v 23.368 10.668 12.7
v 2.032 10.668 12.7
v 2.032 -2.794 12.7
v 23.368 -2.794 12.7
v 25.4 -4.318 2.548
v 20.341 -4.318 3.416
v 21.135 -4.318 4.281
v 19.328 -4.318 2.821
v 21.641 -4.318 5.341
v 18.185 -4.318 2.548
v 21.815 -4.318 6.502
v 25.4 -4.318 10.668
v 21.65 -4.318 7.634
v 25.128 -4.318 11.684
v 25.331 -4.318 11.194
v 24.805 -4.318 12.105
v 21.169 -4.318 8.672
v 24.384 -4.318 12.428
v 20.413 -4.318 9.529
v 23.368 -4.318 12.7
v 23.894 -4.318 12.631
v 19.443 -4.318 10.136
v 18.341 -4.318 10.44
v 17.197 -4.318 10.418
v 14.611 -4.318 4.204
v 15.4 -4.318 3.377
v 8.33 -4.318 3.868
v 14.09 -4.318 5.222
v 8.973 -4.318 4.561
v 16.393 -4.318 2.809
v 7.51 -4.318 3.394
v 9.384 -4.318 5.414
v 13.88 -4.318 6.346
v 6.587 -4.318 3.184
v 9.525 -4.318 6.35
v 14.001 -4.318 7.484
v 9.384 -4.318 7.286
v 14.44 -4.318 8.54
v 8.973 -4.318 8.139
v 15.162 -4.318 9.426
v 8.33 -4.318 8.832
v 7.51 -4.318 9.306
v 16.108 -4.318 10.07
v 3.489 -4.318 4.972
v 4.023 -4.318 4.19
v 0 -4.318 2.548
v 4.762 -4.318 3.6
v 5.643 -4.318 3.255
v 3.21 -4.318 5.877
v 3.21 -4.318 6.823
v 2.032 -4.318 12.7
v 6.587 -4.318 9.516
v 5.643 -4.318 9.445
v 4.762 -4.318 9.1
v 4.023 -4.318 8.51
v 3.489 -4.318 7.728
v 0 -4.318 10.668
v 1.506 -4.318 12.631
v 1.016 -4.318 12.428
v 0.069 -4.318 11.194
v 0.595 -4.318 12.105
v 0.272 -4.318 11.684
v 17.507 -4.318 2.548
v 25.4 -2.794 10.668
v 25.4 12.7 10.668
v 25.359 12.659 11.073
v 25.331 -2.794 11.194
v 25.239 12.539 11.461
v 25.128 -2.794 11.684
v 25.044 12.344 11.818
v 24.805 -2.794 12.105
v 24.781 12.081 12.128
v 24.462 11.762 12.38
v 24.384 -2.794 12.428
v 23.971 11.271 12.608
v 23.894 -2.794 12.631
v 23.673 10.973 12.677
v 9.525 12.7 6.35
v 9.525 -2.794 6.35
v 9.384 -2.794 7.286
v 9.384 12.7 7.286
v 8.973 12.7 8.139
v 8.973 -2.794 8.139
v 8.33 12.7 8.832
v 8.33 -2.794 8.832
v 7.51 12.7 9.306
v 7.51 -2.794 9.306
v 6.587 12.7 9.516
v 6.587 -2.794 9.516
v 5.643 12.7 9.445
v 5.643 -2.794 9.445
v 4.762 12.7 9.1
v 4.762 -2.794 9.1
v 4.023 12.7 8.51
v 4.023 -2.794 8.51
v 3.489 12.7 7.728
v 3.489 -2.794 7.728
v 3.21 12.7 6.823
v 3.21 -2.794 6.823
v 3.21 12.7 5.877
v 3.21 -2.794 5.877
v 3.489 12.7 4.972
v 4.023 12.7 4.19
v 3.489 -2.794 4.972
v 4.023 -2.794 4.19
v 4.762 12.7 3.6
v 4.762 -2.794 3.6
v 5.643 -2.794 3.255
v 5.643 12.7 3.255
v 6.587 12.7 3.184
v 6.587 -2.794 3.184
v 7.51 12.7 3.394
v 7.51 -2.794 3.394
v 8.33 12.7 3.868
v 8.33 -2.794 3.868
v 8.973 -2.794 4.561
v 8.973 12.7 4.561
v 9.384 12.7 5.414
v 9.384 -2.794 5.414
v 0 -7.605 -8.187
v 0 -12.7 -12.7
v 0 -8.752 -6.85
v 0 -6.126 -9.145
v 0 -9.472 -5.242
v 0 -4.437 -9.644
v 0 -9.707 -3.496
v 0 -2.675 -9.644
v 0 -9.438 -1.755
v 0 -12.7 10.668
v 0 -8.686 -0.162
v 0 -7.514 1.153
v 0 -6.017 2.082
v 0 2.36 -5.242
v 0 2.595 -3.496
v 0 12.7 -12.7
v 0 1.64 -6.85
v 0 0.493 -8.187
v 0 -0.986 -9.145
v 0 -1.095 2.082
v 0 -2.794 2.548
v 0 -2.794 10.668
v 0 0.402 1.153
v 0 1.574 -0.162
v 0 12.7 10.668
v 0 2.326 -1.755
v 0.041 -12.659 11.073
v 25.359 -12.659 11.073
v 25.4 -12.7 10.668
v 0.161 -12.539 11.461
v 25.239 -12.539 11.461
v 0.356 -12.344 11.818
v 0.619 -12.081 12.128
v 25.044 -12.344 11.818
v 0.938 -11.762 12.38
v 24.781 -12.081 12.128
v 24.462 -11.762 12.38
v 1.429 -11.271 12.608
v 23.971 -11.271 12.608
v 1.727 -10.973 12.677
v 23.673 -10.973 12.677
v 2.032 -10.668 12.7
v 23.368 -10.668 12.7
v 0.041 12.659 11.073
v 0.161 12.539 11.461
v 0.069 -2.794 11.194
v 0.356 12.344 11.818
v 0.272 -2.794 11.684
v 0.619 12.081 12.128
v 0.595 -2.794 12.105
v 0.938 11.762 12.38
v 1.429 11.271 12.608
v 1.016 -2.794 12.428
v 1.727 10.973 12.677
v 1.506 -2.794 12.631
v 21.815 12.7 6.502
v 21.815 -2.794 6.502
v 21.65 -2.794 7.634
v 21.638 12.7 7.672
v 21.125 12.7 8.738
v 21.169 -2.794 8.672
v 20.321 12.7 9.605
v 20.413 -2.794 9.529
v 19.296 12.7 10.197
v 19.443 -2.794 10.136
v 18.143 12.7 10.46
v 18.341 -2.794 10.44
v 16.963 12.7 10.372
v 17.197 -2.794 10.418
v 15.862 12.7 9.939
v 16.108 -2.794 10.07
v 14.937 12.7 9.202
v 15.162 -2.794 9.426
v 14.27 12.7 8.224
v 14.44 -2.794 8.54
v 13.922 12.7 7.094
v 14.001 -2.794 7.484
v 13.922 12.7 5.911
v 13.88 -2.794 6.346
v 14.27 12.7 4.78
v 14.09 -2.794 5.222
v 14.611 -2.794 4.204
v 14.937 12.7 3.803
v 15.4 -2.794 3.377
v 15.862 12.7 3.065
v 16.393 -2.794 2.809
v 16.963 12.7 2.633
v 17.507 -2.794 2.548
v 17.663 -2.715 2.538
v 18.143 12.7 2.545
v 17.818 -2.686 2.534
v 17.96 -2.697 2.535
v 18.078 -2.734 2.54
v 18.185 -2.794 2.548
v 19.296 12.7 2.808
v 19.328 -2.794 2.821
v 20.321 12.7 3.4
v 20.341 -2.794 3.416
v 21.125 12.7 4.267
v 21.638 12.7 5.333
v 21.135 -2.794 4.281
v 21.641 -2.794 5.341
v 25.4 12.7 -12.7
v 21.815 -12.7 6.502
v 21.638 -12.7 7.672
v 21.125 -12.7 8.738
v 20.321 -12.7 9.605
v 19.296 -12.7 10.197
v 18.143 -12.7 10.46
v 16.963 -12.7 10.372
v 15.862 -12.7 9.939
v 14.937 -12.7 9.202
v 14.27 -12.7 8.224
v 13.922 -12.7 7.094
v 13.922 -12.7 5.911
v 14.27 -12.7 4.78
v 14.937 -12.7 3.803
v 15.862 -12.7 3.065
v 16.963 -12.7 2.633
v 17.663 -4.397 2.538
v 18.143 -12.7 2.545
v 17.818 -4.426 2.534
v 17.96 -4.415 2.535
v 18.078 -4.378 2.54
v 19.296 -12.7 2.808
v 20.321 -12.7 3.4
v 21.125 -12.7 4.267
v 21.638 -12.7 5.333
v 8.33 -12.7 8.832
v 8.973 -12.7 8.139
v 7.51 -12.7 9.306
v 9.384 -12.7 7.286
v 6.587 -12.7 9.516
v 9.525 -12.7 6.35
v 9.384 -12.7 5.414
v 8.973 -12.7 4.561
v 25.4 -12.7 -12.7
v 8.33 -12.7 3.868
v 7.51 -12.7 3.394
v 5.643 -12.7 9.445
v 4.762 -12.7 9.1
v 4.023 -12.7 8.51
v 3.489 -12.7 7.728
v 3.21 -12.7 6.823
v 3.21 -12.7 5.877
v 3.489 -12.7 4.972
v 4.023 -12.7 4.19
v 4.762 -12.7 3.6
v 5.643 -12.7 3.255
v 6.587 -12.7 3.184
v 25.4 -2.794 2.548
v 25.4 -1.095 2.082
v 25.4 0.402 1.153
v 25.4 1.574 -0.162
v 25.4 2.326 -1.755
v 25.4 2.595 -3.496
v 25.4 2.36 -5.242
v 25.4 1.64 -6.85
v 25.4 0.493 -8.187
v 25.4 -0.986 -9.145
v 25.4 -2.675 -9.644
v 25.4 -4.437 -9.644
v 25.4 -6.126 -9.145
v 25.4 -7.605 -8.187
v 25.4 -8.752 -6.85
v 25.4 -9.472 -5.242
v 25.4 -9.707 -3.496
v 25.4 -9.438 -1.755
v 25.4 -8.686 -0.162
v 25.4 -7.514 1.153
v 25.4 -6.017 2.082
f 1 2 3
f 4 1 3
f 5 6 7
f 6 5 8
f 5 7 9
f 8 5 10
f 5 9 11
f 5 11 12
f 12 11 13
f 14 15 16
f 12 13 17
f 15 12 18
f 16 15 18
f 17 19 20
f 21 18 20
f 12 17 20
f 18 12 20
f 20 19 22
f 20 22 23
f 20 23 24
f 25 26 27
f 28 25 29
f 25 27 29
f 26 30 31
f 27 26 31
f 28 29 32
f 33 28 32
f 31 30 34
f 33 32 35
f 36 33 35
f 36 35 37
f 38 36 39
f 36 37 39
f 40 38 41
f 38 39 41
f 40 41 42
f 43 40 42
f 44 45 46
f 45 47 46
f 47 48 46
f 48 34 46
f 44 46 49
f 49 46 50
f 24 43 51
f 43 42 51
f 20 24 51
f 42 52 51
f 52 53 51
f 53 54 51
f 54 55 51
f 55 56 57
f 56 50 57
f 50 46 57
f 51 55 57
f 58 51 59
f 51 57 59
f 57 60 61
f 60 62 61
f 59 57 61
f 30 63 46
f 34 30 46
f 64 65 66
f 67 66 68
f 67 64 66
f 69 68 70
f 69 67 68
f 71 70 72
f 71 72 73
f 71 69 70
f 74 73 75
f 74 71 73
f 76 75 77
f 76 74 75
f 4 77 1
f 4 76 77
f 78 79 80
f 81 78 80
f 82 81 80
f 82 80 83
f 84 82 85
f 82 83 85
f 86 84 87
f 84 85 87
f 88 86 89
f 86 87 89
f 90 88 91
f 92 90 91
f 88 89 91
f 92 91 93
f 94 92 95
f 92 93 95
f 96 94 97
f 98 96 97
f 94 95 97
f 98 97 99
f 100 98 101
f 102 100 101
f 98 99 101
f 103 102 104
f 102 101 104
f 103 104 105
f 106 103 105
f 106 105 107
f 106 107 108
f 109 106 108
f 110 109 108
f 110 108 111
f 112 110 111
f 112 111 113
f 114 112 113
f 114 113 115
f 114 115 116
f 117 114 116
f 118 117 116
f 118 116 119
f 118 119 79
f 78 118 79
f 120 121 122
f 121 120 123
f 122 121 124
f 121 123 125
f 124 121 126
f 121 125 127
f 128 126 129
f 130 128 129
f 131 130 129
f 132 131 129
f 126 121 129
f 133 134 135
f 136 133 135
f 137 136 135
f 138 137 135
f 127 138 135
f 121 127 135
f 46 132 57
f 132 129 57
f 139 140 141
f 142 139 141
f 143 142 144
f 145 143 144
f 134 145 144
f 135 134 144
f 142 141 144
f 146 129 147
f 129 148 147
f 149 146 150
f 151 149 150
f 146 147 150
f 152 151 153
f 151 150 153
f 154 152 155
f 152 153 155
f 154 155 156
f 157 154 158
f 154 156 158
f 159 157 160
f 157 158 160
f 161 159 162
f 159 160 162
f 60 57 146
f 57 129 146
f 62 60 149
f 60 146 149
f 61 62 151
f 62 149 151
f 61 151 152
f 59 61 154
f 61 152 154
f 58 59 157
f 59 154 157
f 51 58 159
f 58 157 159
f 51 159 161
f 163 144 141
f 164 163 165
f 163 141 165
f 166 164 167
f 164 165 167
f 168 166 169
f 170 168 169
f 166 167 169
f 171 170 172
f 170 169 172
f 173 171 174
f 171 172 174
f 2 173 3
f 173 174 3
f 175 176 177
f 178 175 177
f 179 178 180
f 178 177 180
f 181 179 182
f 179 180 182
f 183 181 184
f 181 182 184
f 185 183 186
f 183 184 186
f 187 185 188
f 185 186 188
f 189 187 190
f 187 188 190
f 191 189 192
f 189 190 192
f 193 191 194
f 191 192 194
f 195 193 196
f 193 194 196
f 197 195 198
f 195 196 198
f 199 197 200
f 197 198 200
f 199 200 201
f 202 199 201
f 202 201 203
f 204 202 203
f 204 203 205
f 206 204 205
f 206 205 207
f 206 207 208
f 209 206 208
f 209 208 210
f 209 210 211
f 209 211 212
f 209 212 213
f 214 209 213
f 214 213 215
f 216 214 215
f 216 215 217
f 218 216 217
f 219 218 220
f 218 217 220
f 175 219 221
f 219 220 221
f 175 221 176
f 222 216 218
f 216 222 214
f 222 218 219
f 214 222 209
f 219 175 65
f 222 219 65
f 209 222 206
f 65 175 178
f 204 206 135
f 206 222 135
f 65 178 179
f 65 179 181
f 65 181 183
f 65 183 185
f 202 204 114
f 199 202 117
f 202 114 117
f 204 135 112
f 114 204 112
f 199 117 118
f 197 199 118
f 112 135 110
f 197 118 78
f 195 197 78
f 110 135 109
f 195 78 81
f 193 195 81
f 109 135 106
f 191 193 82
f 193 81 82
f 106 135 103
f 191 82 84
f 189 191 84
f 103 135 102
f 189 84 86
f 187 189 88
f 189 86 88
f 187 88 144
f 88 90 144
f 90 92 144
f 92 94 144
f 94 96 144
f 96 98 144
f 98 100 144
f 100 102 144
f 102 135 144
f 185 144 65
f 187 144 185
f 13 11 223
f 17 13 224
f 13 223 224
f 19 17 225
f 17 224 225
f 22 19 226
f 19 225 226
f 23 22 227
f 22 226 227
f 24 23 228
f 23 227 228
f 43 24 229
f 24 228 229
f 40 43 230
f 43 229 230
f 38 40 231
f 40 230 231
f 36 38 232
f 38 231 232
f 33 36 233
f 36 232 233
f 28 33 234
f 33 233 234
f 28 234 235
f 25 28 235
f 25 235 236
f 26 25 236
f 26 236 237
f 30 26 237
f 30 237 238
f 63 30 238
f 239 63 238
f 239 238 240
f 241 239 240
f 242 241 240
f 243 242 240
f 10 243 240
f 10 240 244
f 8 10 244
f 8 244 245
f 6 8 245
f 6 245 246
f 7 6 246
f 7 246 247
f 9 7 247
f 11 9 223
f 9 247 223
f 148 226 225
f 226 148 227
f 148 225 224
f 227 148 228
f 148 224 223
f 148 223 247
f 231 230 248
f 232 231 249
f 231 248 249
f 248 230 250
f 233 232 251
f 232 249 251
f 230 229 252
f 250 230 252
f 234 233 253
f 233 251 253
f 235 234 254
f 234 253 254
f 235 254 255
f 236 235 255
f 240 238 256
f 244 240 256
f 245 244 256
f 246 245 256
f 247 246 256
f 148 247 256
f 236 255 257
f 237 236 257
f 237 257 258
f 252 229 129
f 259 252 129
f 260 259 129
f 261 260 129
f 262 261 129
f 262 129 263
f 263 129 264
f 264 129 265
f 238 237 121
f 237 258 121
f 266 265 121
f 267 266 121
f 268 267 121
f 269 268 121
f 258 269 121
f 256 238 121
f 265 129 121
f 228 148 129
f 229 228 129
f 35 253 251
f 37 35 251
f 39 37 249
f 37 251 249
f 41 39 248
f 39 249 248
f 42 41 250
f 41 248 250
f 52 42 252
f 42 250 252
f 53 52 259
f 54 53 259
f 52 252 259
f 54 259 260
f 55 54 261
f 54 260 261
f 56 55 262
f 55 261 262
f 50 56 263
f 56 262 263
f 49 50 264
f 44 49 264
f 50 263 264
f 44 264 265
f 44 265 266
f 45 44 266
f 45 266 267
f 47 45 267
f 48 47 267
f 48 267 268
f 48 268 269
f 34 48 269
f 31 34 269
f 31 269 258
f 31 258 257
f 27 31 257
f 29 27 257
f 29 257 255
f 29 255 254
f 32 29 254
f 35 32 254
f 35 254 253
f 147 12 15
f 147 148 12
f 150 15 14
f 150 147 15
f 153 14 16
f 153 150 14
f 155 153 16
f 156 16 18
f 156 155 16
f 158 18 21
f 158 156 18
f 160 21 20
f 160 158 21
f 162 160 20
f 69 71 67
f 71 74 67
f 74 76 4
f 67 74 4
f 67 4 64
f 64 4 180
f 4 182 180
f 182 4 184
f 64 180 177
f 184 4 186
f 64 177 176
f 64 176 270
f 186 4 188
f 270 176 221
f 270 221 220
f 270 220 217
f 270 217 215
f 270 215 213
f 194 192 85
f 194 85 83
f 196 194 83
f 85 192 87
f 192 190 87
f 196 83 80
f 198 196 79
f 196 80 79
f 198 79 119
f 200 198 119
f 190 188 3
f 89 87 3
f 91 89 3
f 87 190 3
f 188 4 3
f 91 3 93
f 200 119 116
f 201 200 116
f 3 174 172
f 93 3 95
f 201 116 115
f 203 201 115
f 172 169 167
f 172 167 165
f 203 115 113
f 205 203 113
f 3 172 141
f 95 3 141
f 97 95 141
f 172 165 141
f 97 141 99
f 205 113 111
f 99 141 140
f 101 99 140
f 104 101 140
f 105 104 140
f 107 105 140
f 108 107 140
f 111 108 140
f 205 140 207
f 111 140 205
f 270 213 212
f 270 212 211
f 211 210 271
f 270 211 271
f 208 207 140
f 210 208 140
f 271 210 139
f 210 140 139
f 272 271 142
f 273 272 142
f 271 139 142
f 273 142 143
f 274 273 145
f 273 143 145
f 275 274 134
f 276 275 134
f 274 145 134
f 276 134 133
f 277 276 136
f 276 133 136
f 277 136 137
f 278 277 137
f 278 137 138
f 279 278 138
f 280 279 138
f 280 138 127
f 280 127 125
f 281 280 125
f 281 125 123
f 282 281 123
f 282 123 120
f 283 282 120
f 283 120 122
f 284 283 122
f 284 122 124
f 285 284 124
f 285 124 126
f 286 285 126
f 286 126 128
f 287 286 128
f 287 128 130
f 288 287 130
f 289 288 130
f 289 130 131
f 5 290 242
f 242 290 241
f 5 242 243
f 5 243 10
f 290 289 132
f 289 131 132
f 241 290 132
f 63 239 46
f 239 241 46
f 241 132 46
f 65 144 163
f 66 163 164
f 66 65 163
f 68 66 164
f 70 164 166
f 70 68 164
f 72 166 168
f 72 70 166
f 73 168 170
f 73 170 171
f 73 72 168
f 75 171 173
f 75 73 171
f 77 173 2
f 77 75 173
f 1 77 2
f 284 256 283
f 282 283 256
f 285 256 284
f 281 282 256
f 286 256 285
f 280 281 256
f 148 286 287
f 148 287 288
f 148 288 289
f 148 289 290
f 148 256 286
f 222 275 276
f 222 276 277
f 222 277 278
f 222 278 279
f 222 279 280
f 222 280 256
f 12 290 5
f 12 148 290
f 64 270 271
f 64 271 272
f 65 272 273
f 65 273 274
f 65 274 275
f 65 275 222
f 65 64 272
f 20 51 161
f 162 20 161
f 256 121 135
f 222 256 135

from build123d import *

# Parameters (mm, degrees)
F1_DEPTH = 25.4
F2_R     = 3.175
F2_R_2   = 3.96875
F3_DEPTH = 25.401
F4_R     = 2.032


with BuildPart() as f1:
    # F0 (on Right) → F1 (new body)
    with BuildSketch(Plane.YZ):
        with BuildLine():
            Line((12.7, -12.7), (12.7, 12.7))
            Line((12.7, 12.7), (-2.794, 12.7))
            Line((-2.794, 12.7), (-2.794, 2.548185))
            ThreePointArc((-2.794, 2.548185), (-3.556, -9.707563), (-4.318, 2.548185))
            Line((-4.318, 2.548185), (-4.318, 12.7))
            Line((-4.318, 12.7), (-12.7, 12.7))
            Line((-12.7, 12.7), (-12.7, -12.7))
            Line((-12.7, -12.7), (12.7, -12.7))
        make_face()
    extrude(amount=F1_DEPTH)

    # F2 (on face) → F3 (cut, through all)
    with BuildSketch(Plane.XZ.offset(12.7)):
        with Locations((6.35, 6.35)):
            Circle(F2_R)
        with Locations((17.846059, 6.5024)):
            Circle(F2_R_2)
    extrude(amount=-F3_DEPTH, mode=Mode.SUBTRACT)

    # F4
    f4_edges = [f1.edges().sort_by_distance(p)[0] for p in [
        (0, 4.953, 12.7),
        (12.7, 12.7, 12.7),
        (25.4, 4.953, 12.7),
        (25.4, -8.509, 12.7),
        (12.7, -12.7, 12.7),
        (0, -8.509, 12.7),
    ]]
    fillet(f4_edges, radius=F4_R)


solid = f1.part
